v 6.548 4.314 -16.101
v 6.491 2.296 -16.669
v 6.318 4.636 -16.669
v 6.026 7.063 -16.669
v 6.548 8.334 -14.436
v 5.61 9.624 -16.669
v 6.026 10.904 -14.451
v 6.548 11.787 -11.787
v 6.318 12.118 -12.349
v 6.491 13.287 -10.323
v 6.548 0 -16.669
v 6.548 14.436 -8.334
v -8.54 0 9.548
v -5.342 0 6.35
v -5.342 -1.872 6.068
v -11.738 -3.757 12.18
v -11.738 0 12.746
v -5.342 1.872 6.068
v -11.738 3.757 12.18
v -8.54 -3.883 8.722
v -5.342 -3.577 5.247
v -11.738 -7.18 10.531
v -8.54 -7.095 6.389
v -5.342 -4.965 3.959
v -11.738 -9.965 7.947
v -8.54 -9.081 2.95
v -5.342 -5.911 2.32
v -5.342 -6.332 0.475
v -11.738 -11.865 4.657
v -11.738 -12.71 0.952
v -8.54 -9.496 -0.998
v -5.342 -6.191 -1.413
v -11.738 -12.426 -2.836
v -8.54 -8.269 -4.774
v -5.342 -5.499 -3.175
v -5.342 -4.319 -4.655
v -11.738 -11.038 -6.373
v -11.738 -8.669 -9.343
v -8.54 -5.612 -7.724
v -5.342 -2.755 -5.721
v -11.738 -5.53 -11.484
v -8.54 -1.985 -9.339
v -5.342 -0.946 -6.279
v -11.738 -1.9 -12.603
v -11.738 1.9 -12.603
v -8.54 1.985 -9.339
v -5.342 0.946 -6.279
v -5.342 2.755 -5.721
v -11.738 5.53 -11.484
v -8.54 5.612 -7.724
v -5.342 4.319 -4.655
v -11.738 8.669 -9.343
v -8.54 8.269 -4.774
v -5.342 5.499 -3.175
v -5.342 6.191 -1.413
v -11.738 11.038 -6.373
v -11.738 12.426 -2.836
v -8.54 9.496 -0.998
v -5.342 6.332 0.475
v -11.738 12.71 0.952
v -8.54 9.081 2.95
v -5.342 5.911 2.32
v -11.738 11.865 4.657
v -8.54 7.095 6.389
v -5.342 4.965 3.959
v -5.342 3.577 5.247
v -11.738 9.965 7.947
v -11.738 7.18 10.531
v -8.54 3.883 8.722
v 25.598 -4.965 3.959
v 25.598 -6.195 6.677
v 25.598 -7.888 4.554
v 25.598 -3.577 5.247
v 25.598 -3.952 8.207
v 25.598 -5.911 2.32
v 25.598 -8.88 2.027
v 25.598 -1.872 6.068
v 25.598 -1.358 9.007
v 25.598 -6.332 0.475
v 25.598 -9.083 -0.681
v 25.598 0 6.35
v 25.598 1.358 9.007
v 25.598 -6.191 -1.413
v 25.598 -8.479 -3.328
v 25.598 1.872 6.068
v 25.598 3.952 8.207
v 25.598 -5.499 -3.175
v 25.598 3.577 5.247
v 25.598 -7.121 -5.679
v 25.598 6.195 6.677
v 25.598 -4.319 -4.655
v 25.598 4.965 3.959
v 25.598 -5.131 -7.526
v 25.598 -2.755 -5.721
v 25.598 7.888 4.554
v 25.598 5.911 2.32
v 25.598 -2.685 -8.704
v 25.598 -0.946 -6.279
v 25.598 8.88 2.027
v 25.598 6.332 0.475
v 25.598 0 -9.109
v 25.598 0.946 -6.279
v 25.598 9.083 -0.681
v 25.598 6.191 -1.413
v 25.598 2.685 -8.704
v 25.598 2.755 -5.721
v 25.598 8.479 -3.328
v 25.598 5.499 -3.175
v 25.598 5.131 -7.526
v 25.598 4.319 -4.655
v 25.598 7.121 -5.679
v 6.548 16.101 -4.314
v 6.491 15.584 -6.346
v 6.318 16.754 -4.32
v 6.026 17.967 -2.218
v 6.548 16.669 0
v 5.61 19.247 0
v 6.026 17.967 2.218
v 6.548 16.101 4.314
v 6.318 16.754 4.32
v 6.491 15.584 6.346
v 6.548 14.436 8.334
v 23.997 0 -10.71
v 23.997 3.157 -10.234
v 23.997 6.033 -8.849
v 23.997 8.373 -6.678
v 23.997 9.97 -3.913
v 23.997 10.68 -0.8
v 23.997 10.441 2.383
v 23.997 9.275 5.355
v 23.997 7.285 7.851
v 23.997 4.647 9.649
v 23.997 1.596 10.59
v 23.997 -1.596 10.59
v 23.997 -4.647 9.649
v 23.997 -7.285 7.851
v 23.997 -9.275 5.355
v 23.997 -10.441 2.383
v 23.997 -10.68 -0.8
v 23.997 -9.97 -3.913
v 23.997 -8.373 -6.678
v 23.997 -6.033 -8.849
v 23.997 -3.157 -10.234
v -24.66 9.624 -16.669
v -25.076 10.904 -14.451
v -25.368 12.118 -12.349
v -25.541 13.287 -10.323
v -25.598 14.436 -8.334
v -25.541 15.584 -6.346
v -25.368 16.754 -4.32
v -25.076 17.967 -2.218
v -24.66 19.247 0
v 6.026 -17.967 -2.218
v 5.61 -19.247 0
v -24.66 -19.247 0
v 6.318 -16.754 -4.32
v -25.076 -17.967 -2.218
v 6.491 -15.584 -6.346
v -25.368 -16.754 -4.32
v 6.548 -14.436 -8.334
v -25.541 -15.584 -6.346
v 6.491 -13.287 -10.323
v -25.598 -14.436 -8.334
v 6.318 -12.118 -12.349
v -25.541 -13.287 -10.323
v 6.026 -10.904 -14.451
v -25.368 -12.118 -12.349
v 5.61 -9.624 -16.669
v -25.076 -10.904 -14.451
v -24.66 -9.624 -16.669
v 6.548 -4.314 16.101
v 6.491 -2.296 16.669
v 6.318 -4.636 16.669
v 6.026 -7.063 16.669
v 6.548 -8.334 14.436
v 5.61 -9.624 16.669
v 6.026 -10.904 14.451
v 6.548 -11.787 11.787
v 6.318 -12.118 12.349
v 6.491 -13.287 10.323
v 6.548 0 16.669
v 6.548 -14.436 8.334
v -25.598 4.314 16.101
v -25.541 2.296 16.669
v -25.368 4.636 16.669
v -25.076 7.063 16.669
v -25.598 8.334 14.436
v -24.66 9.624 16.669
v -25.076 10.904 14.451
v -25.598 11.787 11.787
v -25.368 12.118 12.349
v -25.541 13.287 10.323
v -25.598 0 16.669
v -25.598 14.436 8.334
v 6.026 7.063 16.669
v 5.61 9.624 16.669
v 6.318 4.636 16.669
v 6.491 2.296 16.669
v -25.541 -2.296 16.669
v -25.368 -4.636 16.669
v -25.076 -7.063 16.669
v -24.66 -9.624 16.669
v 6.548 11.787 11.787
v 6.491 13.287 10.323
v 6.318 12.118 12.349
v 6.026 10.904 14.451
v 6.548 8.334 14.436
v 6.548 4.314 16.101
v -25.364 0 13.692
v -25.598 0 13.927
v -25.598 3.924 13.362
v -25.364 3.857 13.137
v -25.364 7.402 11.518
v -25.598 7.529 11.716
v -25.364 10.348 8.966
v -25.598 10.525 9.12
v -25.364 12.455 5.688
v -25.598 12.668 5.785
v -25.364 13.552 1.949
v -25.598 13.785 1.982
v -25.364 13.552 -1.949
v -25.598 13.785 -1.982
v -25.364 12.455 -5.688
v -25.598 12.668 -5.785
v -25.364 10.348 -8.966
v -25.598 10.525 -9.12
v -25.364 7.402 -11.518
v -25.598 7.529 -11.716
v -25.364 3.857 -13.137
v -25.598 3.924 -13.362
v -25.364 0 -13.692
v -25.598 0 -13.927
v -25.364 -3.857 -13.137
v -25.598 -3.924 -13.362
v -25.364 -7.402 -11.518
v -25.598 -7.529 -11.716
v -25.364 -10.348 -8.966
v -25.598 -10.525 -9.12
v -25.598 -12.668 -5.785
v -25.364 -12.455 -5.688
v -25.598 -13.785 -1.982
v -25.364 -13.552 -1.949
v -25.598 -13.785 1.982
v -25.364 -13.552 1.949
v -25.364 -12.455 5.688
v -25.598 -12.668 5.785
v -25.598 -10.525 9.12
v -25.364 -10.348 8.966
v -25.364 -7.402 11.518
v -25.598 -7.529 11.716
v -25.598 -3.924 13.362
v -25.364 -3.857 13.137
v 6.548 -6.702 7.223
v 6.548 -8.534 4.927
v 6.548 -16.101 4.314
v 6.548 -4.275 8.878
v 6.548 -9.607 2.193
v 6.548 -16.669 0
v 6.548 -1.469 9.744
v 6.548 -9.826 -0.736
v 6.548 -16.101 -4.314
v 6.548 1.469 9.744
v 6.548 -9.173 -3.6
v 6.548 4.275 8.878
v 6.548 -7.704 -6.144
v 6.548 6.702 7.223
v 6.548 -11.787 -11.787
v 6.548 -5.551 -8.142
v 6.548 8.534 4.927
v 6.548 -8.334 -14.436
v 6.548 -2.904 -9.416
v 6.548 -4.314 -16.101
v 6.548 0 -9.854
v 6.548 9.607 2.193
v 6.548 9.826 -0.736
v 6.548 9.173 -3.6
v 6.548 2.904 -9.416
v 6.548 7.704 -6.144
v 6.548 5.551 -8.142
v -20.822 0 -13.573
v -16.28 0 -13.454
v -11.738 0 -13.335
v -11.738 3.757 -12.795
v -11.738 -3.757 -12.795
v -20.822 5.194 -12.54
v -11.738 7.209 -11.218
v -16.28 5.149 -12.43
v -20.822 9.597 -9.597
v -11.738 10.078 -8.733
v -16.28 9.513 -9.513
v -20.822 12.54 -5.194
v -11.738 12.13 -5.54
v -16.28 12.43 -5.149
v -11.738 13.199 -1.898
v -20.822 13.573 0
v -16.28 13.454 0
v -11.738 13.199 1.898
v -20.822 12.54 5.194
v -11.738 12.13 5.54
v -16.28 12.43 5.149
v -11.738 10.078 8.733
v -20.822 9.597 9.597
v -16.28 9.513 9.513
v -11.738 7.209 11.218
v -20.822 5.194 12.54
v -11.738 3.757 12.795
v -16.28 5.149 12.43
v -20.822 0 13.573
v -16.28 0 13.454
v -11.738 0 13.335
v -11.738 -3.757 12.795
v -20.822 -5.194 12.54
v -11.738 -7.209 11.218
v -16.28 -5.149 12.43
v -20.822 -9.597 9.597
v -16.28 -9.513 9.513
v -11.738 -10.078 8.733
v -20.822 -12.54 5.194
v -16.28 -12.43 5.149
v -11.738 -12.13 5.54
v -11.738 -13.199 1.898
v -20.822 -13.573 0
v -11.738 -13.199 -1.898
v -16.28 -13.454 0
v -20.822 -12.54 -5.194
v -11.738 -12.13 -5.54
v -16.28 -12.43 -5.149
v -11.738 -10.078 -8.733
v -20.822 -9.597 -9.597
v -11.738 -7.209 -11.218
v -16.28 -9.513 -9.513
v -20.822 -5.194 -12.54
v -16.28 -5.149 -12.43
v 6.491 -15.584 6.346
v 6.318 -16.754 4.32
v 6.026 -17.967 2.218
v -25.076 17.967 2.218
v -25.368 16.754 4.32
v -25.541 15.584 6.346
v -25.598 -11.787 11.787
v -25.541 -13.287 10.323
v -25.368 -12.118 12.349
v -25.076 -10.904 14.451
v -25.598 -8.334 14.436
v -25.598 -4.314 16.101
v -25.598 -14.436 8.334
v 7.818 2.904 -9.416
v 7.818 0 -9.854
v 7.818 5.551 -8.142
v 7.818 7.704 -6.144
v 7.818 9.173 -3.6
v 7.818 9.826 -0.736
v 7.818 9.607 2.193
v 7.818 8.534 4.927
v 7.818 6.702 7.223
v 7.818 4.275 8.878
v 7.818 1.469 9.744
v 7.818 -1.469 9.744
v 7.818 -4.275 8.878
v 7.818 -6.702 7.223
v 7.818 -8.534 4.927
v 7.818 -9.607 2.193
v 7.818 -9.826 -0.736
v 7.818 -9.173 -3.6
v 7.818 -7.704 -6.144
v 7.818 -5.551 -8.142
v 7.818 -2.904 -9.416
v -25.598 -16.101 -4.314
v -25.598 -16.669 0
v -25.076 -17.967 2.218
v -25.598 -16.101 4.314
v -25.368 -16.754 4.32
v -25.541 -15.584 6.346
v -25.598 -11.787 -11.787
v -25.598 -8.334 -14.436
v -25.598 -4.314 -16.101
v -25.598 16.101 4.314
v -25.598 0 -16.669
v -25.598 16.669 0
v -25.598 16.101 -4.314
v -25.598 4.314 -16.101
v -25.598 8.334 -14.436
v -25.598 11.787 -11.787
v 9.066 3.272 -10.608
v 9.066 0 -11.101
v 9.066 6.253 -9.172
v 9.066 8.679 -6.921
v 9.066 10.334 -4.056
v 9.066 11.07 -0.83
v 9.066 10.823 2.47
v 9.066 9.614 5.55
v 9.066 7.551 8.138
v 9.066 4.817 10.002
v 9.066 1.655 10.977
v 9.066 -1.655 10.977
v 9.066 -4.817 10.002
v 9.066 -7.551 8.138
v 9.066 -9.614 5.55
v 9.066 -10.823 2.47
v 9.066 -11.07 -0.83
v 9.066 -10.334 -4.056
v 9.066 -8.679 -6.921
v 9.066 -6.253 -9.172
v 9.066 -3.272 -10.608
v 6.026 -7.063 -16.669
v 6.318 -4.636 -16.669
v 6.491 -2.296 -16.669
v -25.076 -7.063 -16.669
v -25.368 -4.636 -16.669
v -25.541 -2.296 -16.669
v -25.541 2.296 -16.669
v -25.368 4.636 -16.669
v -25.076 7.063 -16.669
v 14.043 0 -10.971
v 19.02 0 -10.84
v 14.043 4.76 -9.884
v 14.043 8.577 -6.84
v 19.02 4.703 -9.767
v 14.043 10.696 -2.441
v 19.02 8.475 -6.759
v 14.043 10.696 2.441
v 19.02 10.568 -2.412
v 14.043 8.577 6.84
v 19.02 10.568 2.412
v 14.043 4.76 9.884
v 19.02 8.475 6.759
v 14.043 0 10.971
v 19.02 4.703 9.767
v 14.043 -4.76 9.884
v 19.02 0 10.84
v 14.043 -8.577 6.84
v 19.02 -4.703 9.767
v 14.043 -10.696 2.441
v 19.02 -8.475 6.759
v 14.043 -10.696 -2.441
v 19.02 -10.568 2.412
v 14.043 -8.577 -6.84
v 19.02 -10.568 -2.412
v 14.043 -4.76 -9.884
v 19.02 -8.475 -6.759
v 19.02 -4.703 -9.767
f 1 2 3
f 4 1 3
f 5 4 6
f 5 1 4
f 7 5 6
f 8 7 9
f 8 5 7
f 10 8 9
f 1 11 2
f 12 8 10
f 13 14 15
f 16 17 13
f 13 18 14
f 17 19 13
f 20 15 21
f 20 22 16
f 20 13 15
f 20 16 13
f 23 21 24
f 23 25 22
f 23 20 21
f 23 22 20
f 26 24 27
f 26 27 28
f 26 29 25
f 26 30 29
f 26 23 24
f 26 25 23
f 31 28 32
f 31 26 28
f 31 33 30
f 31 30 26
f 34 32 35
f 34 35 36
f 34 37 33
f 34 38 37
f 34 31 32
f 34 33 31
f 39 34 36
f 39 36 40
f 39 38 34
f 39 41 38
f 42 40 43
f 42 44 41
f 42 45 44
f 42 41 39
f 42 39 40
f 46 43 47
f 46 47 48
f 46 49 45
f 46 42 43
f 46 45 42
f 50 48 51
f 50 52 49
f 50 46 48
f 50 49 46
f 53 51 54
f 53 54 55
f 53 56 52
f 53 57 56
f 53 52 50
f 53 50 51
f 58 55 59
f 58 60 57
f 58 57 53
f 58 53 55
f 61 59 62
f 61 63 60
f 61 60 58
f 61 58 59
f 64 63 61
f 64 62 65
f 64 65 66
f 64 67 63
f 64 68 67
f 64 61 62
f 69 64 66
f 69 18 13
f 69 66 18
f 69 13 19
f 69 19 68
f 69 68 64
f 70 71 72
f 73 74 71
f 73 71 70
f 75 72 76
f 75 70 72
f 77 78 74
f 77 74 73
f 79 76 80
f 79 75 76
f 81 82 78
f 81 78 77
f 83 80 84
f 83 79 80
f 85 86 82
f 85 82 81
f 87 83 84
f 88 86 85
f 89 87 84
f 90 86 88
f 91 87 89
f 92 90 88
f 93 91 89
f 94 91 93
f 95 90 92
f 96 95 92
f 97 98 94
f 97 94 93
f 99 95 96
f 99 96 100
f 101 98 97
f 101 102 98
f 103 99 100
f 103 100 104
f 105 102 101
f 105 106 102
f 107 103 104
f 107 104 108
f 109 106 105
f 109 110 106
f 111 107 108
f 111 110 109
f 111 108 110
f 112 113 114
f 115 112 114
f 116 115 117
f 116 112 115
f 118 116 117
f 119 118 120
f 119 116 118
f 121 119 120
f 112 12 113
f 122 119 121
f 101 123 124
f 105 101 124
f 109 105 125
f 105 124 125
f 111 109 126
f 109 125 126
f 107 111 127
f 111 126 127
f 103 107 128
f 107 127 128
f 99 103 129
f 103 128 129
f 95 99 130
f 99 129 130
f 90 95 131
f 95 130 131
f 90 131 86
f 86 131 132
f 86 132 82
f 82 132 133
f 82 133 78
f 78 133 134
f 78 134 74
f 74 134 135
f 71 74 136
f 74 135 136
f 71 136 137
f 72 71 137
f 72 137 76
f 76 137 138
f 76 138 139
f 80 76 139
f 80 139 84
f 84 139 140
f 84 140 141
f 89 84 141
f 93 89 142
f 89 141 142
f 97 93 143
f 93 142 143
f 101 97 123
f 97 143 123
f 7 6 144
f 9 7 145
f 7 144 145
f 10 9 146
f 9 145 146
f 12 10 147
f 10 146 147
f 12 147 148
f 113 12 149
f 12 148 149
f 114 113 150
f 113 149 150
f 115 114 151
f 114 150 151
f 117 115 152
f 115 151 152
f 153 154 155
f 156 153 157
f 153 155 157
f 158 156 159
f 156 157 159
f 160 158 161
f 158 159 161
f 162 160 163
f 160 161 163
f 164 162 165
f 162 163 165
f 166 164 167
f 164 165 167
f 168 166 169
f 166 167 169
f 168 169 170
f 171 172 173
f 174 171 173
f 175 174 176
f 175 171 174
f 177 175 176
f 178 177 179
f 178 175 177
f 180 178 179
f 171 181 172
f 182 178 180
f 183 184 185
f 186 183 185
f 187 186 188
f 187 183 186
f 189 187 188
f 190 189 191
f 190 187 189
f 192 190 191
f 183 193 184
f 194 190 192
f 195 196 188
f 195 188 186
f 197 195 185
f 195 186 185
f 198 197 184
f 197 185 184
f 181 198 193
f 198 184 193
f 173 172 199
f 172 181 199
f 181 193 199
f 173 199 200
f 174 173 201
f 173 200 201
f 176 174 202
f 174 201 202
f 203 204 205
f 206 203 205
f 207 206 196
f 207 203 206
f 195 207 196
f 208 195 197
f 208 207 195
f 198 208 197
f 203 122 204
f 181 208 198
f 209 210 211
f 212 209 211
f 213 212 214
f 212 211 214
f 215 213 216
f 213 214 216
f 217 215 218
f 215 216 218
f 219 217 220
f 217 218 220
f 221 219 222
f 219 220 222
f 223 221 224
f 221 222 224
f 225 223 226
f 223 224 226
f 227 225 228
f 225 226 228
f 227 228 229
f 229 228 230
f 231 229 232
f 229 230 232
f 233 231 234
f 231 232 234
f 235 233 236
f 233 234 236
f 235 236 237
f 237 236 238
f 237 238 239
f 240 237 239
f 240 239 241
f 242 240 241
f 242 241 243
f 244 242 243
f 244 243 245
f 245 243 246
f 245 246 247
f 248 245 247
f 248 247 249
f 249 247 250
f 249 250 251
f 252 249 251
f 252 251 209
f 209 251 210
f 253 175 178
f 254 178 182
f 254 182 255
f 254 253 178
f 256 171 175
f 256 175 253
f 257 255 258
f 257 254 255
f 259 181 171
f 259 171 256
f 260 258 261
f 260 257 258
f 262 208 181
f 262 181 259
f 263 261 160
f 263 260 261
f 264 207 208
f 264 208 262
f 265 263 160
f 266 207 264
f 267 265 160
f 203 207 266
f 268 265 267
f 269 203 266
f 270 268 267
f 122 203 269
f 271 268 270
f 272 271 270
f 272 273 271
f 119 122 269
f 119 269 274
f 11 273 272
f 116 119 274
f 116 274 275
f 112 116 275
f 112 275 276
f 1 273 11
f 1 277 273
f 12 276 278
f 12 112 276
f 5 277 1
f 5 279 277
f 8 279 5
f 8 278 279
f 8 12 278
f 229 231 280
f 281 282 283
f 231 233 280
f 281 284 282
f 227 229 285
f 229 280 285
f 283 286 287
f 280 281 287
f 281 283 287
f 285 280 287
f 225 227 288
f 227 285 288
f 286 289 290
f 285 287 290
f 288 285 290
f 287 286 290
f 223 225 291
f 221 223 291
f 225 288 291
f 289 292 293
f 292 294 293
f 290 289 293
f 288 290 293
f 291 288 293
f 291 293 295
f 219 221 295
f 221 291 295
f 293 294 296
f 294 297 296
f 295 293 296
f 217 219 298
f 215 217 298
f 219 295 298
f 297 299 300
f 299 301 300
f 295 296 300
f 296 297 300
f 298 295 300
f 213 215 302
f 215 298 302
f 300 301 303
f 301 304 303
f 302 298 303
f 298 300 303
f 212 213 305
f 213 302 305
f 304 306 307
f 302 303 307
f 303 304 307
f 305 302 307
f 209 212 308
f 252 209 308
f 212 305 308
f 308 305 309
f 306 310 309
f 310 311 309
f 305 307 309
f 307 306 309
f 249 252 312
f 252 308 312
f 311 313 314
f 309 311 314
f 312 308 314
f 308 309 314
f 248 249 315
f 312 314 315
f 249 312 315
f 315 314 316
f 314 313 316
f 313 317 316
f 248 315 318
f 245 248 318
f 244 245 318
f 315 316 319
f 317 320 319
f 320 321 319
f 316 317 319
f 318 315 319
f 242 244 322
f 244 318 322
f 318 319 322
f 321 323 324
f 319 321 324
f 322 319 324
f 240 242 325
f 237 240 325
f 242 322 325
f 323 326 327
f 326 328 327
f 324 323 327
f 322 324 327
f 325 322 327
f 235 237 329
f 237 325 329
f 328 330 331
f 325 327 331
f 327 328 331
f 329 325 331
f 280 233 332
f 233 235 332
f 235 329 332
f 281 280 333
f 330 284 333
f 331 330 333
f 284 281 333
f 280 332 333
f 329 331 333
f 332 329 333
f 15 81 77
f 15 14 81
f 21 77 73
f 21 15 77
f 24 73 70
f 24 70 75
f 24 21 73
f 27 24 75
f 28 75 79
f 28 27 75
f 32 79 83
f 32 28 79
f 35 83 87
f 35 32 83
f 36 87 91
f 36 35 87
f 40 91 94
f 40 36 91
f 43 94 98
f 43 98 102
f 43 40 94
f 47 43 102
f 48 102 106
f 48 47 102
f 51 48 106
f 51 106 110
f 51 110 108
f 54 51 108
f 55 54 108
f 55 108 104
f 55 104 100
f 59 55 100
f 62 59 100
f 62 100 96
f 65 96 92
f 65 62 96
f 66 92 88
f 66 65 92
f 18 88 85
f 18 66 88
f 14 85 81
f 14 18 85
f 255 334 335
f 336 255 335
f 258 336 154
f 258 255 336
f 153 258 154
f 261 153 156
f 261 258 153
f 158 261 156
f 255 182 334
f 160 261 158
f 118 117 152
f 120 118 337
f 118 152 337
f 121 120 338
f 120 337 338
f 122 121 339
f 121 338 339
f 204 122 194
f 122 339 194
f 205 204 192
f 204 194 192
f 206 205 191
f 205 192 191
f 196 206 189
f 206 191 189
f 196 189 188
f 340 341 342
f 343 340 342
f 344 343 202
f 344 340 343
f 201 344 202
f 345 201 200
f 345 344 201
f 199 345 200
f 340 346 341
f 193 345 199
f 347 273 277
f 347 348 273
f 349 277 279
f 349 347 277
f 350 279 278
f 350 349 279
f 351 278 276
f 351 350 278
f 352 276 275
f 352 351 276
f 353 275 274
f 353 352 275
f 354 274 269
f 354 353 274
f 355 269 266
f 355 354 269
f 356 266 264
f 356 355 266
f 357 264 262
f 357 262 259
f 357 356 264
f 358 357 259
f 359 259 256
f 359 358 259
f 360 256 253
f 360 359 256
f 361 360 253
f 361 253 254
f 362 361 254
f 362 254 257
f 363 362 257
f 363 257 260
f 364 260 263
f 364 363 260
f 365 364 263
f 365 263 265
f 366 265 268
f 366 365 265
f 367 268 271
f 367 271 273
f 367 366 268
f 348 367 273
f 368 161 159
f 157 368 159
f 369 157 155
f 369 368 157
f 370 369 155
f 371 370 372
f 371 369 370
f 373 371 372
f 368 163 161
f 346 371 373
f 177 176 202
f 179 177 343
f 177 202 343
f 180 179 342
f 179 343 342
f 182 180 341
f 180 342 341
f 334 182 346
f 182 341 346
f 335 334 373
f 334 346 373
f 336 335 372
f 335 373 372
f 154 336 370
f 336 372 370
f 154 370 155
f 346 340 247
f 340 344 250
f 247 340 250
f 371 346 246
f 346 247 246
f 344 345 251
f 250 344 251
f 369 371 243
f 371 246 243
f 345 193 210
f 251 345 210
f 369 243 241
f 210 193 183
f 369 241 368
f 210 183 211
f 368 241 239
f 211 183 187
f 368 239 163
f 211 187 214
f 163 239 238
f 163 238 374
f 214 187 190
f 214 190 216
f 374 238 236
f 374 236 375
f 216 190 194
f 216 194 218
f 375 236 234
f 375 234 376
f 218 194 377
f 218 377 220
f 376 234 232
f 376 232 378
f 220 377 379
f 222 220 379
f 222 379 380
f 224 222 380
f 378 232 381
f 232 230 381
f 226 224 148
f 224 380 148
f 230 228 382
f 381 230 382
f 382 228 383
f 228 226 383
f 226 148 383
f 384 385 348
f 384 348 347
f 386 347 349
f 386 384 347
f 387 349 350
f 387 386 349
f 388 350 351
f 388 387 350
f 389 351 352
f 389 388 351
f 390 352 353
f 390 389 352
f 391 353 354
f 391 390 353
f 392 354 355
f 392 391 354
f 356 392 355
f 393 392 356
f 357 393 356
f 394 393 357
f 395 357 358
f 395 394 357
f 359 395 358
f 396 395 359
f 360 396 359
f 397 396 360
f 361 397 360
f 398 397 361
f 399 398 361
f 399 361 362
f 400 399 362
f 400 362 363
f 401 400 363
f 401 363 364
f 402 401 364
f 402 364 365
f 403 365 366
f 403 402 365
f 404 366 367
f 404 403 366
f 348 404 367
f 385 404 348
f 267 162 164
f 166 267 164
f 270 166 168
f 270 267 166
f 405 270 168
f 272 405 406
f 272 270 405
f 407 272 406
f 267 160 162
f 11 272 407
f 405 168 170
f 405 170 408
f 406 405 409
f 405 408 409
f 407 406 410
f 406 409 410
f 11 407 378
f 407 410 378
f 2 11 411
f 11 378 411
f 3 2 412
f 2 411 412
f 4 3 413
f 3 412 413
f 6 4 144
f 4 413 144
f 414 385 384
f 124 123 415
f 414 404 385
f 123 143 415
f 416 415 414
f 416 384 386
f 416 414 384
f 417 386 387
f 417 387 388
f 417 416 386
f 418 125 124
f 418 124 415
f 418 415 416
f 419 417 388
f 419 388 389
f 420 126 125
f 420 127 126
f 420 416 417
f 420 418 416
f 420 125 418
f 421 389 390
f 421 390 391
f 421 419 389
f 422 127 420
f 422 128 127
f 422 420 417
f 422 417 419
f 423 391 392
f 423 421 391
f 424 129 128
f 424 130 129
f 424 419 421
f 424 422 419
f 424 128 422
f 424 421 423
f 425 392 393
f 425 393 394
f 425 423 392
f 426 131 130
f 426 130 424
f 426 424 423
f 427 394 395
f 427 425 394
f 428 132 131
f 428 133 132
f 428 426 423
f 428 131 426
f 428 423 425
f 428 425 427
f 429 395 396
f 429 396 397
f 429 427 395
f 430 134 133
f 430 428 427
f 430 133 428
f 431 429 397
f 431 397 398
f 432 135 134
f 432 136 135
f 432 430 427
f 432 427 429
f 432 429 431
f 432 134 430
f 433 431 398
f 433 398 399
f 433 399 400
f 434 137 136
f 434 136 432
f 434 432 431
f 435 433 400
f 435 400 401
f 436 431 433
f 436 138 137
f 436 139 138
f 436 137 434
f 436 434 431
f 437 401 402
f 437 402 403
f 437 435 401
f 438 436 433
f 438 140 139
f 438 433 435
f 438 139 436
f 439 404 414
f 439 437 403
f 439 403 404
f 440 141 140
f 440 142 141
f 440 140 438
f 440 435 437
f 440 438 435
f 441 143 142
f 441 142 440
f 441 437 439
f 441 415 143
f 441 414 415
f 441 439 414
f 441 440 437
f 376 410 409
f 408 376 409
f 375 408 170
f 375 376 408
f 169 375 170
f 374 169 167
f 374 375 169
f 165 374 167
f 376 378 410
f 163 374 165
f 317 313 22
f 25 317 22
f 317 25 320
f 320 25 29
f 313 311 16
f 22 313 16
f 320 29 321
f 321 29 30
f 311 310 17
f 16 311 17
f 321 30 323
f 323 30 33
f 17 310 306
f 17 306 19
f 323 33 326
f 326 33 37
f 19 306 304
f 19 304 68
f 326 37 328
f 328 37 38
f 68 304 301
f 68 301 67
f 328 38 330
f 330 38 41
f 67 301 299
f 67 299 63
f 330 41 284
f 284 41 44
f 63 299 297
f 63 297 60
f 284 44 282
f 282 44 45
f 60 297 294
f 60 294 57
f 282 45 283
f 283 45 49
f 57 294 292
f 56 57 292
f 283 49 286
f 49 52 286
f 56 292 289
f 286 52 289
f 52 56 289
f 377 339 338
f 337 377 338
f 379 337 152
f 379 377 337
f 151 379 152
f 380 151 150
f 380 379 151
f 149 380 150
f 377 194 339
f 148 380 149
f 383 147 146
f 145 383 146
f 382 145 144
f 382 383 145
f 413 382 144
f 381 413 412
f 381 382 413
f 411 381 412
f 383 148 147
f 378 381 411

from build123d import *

# Parameters (mm, degrees)
EXTRUDE1_DEPTH     = 32.146875
SKETCH3_OUTSIDE_W  = 278.22
SKETCH3_OUTSIDE_H  = 283.376
SKETCH3_OUTSIDE_R  = 16.66875
CUT_EXTRUDE1_DEPTH = 42.008923024
CUT_EXTRUDE1_DRAFT = -70
SKETCH4_OUTSIDE_W  = 278.22
SKETCH4_OUTSIDE_H  = 283.376
SKETCH4_OUTSIDE_R  = 16.66875
CUT_EXTRUDE2_DEPTH = 42.008923024
CUT_EXTRUDE2_DRAFT = -70
SKETCH5_R          = 10.668
EXTRUDE2_DEPTH     = 19.05
EXTRUDE2_DRAFT     = 1.5
SKETCH7_R          = 13.335
CUT_EXTRUDE4_DEPTH = 46.191749083
CUT_EXTRUDE4_DRAFT = 1.5
SKETCH12_W         = 6.35
SKETCH12_H         = 19.247414599
SKETCH15_R         = 13.926557298
CUT_EXTRUDE7_DEPTH = 5.08
CUT_EXTRUDE7_DRAFT = -45


with BuildPart() as part:
    # Sketch2 → Extrude1 (new body)
    with BuildSketch(Plane(origin=(-25.5984375, 0, 0), x_dir=(0, 0, -1), z_dir=(1, 0, 0))):
        Polygon((0, 19.247414599), (-16.66875, 9.6237073), (-16.66875, -9.6237073), (0, -19.247414599), (16.66875, -9.6237073), (16.66875, 9.6237073), align=None)
    extrude(amount=EXTRUDE1_DEPTH)


with BuildPart() as cut_extrude1_tool:
    # Sketch3 outside → Cut-Extrude1 (with draft: the straight prism first)
    with BuildSketch(Plane(origin=(6.5484375, 0, 0), x_dir=(0, 0, -1), z_dir=(1, 0, 0))):
        Rectangle(SKETCH3_OUTSIDE_W, SKETCH3_OUTSIDE_H)
        Circle(SKETCH3_OUTSIDE_R, mode=Mode.SUBTRACT)
    extrude(amount=-CUT_EXTRUDE1_DEPTH)
    # Cut-Extrude1: the draft: its side faces are tilted about the plane it starts from
    cut_extrude1_sides = [cut_extrude1_tool.faces().sort_by_distance(p)[0] for p in [
        (-14.456024012, -141.688, 0),
        (-14.456024012, 0, -139.11),
        (-14.456024012, 141.688, 0),
        (-14.456024012, 0, 139.11),
        (-14.456024012, 0, 16.66875),
    ]]
    draft(cut_extrude1_sides, Plane(origin=(6.5484375, 0, 0), x_dir=(0, 0, -1), z_dir=(1, 0, 0)), CUT_EXTRUDE1_DRAFT)


with BuildPart() as part_1:
    add(part.part)

    # Cut-Extrude1: cut by cut_extrude1_tool
    add(cut_extrude1_tool.part, mode=Mode.SUBTRACT)


with BuildPart() as cut_extrude2_tool:
    # Sketch4 outside → Cut-Extrude2 (with draft: the straight prism first)
    with BuildSketch(Plane.ZY.offset(25.5984375)):
        Rectangle(SKETCH4_OUTSIDE_W, SKETCH4_OUTSIDE_H)
        Circle(SKETCH4_OUTSIDE_R, mode=Mode.SUBTRACT)
    extrude(amount=-CUT_EXTRUDE2_DEPTH)
    # Cut-Extrude2: the draft: its side faces are tilted about the plane it starts from
    cut_extrude2_sides = [cut_extrude2_tool.faces().sort_by_distance(p)[0] for p in [
        (-4.593975988, -141.688, 0),
        (-4.593975988, 0, 139.11),
        (-4.593975988, 141.688, 0),
        (-4.593975988, 0, -139.11),
        (-4.593975988, 0, -16.66875),
    ]]
    draft(cut_extrude2_sides, Plane.ZY.offset(25.5984375), CUT_EXTRUDE2_DRAFT)


with BuildPart() as part_2:
    add(part_1.part)

    # Cut-Extrude2: cut by cut_extrude2_tool
    add(cut_extrude2_tool.part, mode=Mode.SUBTRACT)


with BuildPart() as body_2:
    # Sketch5 → Extrude2 (with draft: the straight prism first)
    with BuildSketch(Plane(origin=(25.5984375, 0, 0), x_dir=(0, 0, -1), z_dir=(1, 0, 0))):
        Circle(SKETCH5_R)
    extrude(amount=-EXTRUDE2_DEPTH)
    # Extrude2: the draft: its side faces are tilted about the plane it starts from
    extrude2_sides = [body_2.faces().sort_by_distance(p)[0] for p in [
        (16.0734375, 0, 10.668),
    ]]
    draft(extrude2_sides, Plane(origin=(25.5984375, 0, 0), x_dir=(0, 0, -1), z_dir=(1, 0, 0)), EXTRUDE2_DRAFT)

    # Sketch17 → Cut-Revolve2 (revolve, cut)
    with BuildSketch(Plane.XY, mode=Mode.PRIVATE) as cut_revolve2_sk:
        Polygon((25.5984375, 10.979645334), (25.5984375, 9.108586861), (23.727379027, 10.979645334), align=None)
        Polygon((6.5484375, 9.853808667), (7.8184375, 9.853808667), (9.325274167, 11.360645334), (6.5484375, 11.360645334), align=None)
    revolve(cut_revolve2_sk.sketch.rotate(Axis((-25.5984375, 0, 0), (1, 0, 0)), 270), axis=Axis((-25.5984375, 0, 0), (1, 0, 0)), mode=Mode.SUBTRACT)


with BuildPart() as cut_extrude4_tool:
    # Sketch7 → Cut-Extrude4 (with draft: the straight prism first)
    with BuildSketch(Plane(origin=(-11.7376575, 0, 0), x_dir=(0, 0, -1), z_dir=(1, 0, 0))):
        Circle(SKETCH7_R)
    extrude(amount=-CUT_EXTRUDE4_DEPTH)
    # Cut-Extrude4: the draft: its side faces are tilted about the plane it starts from
    cut_extrude4_sides = [cut_extrude4_tool.faces().sort_by_distance(p)[0] for p in [
        (-34.833532041, 0, 13.335),
    ]]
    draft(cut_extrude4_sides, Plane(origin=(-11.7376575, 0, 0), x_dir=(0, 0, -1), z_dir=(1, 0, 0)), CUT_EXTRUDE4_DRAFT)


with BuildPart() as part_3:
    add(part_2.part)

    # Cut-Extrude4: cut by cut_extrude4_tool
    add(cut_extrude4_tool.part, mode=Mode.SUBTRACT)


with BuildPart() as body_2_1:
    add(body_2.part)

    # Combine1: union part
    add(part_3.part)

    # Sketch12 → Cut-Revolve1 (revolve, cut)
    with BuildSketch(Plane.XY, mode=Mode.PRIVATE) as cut_revolve1_sk:
        Polygon((-11.7376575, 12.745793431), (-11.7376575, 0), (25.5984375, 0), (25.5984375, 6.35), (-5.341864069, 6.35), align=None)
        with Locations((-28.7734375, 9.6237073)):
            Rectangle(SKETCH12_W, SKETCH12_H)
    revolve(cut_revolve1_sk.sketch.rotate(Axis((-25.5984375, 0, 0), (1, 0, 0)), 90), axis=Axis((-25.5984375, 0, 0), (1, 0, 0)), mode=Mode.SUBTRACT)


with BuildPart() as cut_extrude7_tool:
    # Sketch15 → Cut-Extrude7 (with draft: the straight prism first)
    with BuildSketch(Plane.ZY.offset(25.5984375)):
        Circle(SKETCH15_R)
    extrude(amount=-CUT_EXTRUDE7_DEPTH)
    # Cut-Extrude7: the draft: its side faces are tilted about the plane it starts from
    cut_extrude7_sides = [cut_extrude7_tool.faces().sort_by_distance(p)[0] for p in [
        (-23.0584375, 0, -13.926557298),
    ]]
    draft(cut_extrude7_sides, Plane.ZY.offset(25.5984375), CUT_EXTRUDE7_DRAFT)


with BuildPart() as body_2_2:
    add(body_2_1.part)

    # Cut-Extrude7: cut by cut_extrude7_tool
    add(cut_extrude7_tool.part, mode=Mode.SUBTRACT)


solid = body_2_2.part
